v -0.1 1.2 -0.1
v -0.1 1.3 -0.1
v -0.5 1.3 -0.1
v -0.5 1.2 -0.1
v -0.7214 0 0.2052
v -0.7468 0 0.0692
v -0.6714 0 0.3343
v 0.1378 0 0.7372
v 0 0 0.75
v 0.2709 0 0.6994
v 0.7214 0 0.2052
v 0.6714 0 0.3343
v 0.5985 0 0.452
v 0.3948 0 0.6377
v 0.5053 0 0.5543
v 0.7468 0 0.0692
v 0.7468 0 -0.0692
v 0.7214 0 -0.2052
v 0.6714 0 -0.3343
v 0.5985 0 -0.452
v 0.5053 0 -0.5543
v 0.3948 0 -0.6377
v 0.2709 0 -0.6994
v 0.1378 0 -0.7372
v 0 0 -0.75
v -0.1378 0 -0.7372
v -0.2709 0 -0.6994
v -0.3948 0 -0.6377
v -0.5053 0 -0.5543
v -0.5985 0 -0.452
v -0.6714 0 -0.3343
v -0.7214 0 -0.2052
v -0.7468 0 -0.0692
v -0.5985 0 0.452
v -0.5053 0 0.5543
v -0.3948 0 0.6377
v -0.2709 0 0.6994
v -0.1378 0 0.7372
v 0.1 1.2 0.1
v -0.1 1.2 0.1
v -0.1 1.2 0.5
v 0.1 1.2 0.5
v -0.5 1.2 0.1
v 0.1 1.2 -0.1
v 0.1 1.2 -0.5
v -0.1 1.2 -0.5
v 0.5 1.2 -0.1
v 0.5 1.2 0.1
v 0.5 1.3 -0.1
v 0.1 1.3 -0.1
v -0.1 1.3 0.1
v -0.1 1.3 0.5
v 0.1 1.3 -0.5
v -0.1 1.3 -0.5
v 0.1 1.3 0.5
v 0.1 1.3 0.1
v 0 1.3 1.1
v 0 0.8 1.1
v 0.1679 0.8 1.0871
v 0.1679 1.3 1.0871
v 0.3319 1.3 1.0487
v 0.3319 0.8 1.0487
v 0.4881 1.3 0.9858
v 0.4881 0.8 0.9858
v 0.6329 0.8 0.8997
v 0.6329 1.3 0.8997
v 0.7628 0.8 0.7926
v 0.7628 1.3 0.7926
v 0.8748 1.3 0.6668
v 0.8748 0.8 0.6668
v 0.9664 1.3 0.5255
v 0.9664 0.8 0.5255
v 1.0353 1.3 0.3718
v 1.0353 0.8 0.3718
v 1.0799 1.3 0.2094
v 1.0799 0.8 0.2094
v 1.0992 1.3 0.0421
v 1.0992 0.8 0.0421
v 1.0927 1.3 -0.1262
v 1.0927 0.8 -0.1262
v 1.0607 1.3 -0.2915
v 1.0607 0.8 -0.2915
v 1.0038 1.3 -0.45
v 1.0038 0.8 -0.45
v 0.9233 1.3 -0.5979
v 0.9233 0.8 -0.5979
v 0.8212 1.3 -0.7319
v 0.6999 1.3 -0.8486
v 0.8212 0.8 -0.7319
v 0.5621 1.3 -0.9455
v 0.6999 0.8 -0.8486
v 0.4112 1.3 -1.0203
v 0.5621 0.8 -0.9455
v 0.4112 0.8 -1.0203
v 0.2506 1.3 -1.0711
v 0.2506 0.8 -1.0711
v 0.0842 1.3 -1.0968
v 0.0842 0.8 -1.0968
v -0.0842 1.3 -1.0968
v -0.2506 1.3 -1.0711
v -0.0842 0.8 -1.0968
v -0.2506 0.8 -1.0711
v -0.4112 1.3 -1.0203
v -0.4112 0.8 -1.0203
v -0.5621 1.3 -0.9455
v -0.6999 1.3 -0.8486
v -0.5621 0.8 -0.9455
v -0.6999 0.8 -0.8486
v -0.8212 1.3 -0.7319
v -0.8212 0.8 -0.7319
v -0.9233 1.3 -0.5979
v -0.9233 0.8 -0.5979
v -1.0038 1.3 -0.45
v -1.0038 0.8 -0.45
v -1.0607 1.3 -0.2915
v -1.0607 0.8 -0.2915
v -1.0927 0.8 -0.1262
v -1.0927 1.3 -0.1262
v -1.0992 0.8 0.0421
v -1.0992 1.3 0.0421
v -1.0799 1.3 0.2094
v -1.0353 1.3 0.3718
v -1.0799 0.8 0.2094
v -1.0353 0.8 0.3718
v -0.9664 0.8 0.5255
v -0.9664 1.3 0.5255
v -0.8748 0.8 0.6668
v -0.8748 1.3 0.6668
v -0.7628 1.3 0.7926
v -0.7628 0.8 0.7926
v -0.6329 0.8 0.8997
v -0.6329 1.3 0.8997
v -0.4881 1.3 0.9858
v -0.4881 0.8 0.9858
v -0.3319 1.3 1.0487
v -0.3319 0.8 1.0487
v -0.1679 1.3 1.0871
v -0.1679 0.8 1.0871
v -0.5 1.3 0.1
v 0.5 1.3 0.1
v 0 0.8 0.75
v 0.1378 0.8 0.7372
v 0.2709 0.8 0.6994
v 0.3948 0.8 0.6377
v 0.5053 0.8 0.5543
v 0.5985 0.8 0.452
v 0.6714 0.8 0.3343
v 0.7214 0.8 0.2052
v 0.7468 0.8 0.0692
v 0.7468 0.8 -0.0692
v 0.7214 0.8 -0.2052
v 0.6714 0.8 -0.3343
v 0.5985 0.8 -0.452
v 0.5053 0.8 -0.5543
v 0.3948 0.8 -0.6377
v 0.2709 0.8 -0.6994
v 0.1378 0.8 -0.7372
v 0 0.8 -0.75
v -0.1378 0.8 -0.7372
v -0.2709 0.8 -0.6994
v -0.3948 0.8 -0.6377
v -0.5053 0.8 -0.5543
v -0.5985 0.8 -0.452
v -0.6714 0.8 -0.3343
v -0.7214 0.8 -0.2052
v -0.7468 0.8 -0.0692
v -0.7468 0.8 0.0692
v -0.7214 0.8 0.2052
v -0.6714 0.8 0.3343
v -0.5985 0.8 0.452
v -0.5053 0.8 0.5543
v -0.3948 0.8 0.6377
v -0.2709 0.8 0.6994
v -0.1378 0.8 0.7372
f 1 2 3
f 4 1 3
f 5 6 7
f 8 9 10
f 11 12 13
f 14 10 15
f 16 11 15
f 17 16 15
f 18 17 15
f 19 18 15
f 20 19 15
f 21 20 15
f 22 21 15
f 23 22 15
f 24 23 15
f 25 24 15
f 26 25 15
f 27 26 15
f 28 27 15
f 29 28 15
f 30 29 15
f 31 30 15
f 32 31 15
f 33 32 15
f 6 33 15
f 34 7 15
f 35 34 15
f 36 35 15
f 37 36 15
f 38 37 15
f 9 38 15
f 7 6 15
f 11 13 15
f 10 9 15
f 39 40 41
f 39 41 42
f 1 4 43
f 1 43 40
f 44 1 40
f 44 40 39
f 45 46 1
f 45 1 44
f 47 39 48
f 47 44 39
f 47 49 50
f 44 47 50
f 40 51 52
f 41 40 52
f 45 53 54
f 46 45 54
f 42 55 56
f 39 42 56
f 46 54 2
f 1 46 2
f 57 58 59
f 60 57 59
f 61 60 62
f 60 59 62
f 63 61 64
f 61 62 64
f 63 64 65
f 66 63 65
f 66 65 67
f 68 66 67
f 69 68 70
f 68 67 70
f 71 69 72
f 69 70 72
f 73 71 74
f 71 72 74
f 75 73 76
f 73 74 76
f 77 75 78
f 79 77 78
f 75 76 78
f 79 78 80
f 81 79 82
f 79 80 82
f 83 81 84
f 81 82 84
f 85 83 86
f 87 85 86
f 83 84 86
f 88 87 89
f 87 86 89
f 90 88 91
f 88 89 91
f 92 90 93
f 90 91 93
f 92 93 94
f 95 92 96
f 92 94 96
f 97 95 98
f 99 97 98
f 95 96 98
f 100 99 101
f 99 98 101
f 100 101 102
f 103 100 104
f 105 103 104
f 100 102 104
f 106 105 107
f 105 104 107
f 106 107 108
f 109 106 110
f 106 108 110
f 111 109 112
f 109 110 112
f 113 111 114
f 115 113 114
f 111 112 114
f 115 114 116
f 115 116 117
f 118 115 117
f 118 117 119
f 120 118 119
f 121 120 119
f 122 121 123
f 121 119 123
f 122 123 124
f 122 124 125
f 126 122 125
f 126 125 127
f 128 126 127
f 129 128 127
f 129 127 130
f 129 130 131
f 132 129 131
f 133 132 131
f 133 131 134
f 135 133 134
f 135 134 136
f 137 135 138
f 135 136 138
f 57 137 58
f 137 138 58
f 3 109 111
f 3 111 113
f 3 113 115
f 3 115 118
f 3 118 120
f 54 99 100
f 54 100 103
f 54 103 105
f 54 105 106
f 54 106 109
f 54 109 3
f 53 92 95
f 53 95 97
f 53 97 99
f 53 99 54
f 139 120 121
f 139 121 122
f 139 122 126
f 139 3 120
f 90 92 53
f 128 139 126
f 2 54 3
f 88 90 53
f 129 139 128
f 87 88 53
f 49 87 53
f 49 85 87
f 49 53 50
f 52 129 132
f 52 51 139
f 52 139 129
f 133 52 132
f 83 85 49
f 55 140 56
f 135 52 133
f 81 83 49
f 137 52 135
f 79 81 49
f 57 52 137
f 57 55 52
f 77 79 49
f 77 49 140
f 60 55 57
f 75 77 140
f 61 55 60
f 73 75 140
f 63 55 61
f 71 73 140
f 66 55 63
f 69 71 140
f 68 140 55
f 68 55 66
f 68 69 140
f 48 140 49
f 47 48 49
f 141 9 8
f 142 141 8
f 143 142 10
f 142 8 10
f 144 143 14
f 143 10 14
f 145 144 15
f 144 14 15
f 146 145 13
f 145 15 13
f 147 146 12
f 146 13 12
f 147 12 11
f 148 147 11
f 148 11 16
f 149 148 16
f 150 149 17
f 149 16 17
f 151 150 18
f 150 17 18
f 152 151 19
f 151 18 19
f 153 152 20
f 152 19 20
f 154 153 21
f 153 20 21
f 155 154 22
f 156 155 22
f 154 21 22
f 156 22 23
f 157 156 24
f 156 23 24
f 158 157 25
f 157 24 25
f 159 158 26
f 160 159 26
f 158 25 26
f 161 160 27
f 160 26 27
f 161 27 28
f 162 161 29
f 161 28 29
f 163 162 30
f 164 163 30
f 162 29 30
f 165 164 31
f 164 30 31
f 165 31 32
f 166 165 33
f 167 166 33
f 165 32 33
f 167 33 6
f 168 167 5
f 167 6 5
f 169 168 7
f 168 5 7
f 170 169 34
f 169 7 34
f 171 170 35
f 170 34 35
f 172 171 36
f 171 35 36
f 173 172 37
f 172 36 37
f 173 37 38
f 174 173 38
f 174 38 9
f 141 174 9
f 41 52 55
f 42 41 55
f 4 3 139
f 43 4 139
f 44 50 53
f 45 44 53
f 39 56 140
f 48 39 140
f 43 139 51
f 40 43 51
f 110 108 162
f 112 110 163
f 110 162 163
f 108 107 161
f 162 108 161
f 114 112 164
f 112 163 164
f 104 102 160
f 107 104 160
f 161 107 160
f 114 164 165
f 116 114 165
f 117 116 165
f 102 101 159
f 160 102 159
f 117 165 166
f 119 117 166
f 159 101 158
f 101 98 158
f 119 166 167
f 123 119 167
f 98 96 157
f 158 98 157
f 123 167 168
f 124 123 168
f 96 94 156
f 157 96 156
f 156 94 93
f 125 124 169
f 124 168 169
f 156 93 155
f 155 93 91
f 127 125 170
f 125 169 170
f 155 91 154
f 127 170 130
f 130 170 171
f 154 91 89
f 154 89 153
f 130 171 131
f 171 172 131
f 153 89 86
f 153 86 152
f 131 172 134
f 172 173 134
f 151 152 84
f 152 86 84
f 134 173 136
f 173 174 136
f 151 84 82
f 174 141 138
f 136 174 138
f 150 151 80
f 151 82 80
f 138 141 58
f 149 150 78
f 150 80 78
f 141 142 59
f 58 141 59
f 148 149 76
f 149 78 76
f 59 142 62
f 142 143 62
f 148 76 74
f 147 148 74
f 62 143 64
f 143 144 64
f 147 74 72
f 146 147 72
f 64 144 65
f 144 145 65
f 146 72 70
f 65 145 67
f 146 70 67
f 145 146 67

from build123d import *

# Parameters (mm, degrees)
SKETCH1_R           = 0.75
BOSS_EXTRUDE1_DEPTH = 0.8
SKETCH2_R           = 1.1
BOSS_EXTRUDE2_DEPTH = 0.5
CUT_EXTRUDE1_DEPTH  = 0.1


with BuildPart() as part:
    # Sketch1 → Boss-Extrude1 (new body)
    with BuildSketch(Plane(origin=(0, 0, 0), x_dir=(1, 0, 0), z_dir=(0, 1, 0))):
        with Locations(Location((0, 0, 0), (0, 0, 270))):
            Circle(SKETCH1_R)
    extrude(amount=BOSS_EXTRUDE1_DEPTH)

    # Sketch2 → Boss-Extrude2 (add)
    with BuildSketch(Plane(origin=(0, 0.8, 0), x_dir=(1, 0, 0), z_dir=(0, 1, 0))):
        with Locations(Location((0, 0, 0), (0, 0, 270))):
            Circle(SKETCH2_R)
    extrude(amount=BOSS_EXTRUDE2_DEPTH)

    # Sketch3 → Cut-Extrude1 (cut)
    with BuildSketch(Plane(origin=(0, 1.3, 0), x_dir=(1, 0, 0), z_dir=(0, 1, 0))):
        Polygon((-0.1, -0.1), (-0.1, -0.5), (0.1, -0.5), (0.1, -0.1), (0.5, -0.1), (0.5, 0.1), (0.1, 0.1), (0.1, 0.5), (-0.1, 0.5), (-0.1, 0.1), (-0.5, 0.1), (-0.5, -0.1), align=None)
    extrude(amount=-CUT_EXTRUDE1_DEPTH, mode=Mode.SUBTRACT)


solid = part.part
